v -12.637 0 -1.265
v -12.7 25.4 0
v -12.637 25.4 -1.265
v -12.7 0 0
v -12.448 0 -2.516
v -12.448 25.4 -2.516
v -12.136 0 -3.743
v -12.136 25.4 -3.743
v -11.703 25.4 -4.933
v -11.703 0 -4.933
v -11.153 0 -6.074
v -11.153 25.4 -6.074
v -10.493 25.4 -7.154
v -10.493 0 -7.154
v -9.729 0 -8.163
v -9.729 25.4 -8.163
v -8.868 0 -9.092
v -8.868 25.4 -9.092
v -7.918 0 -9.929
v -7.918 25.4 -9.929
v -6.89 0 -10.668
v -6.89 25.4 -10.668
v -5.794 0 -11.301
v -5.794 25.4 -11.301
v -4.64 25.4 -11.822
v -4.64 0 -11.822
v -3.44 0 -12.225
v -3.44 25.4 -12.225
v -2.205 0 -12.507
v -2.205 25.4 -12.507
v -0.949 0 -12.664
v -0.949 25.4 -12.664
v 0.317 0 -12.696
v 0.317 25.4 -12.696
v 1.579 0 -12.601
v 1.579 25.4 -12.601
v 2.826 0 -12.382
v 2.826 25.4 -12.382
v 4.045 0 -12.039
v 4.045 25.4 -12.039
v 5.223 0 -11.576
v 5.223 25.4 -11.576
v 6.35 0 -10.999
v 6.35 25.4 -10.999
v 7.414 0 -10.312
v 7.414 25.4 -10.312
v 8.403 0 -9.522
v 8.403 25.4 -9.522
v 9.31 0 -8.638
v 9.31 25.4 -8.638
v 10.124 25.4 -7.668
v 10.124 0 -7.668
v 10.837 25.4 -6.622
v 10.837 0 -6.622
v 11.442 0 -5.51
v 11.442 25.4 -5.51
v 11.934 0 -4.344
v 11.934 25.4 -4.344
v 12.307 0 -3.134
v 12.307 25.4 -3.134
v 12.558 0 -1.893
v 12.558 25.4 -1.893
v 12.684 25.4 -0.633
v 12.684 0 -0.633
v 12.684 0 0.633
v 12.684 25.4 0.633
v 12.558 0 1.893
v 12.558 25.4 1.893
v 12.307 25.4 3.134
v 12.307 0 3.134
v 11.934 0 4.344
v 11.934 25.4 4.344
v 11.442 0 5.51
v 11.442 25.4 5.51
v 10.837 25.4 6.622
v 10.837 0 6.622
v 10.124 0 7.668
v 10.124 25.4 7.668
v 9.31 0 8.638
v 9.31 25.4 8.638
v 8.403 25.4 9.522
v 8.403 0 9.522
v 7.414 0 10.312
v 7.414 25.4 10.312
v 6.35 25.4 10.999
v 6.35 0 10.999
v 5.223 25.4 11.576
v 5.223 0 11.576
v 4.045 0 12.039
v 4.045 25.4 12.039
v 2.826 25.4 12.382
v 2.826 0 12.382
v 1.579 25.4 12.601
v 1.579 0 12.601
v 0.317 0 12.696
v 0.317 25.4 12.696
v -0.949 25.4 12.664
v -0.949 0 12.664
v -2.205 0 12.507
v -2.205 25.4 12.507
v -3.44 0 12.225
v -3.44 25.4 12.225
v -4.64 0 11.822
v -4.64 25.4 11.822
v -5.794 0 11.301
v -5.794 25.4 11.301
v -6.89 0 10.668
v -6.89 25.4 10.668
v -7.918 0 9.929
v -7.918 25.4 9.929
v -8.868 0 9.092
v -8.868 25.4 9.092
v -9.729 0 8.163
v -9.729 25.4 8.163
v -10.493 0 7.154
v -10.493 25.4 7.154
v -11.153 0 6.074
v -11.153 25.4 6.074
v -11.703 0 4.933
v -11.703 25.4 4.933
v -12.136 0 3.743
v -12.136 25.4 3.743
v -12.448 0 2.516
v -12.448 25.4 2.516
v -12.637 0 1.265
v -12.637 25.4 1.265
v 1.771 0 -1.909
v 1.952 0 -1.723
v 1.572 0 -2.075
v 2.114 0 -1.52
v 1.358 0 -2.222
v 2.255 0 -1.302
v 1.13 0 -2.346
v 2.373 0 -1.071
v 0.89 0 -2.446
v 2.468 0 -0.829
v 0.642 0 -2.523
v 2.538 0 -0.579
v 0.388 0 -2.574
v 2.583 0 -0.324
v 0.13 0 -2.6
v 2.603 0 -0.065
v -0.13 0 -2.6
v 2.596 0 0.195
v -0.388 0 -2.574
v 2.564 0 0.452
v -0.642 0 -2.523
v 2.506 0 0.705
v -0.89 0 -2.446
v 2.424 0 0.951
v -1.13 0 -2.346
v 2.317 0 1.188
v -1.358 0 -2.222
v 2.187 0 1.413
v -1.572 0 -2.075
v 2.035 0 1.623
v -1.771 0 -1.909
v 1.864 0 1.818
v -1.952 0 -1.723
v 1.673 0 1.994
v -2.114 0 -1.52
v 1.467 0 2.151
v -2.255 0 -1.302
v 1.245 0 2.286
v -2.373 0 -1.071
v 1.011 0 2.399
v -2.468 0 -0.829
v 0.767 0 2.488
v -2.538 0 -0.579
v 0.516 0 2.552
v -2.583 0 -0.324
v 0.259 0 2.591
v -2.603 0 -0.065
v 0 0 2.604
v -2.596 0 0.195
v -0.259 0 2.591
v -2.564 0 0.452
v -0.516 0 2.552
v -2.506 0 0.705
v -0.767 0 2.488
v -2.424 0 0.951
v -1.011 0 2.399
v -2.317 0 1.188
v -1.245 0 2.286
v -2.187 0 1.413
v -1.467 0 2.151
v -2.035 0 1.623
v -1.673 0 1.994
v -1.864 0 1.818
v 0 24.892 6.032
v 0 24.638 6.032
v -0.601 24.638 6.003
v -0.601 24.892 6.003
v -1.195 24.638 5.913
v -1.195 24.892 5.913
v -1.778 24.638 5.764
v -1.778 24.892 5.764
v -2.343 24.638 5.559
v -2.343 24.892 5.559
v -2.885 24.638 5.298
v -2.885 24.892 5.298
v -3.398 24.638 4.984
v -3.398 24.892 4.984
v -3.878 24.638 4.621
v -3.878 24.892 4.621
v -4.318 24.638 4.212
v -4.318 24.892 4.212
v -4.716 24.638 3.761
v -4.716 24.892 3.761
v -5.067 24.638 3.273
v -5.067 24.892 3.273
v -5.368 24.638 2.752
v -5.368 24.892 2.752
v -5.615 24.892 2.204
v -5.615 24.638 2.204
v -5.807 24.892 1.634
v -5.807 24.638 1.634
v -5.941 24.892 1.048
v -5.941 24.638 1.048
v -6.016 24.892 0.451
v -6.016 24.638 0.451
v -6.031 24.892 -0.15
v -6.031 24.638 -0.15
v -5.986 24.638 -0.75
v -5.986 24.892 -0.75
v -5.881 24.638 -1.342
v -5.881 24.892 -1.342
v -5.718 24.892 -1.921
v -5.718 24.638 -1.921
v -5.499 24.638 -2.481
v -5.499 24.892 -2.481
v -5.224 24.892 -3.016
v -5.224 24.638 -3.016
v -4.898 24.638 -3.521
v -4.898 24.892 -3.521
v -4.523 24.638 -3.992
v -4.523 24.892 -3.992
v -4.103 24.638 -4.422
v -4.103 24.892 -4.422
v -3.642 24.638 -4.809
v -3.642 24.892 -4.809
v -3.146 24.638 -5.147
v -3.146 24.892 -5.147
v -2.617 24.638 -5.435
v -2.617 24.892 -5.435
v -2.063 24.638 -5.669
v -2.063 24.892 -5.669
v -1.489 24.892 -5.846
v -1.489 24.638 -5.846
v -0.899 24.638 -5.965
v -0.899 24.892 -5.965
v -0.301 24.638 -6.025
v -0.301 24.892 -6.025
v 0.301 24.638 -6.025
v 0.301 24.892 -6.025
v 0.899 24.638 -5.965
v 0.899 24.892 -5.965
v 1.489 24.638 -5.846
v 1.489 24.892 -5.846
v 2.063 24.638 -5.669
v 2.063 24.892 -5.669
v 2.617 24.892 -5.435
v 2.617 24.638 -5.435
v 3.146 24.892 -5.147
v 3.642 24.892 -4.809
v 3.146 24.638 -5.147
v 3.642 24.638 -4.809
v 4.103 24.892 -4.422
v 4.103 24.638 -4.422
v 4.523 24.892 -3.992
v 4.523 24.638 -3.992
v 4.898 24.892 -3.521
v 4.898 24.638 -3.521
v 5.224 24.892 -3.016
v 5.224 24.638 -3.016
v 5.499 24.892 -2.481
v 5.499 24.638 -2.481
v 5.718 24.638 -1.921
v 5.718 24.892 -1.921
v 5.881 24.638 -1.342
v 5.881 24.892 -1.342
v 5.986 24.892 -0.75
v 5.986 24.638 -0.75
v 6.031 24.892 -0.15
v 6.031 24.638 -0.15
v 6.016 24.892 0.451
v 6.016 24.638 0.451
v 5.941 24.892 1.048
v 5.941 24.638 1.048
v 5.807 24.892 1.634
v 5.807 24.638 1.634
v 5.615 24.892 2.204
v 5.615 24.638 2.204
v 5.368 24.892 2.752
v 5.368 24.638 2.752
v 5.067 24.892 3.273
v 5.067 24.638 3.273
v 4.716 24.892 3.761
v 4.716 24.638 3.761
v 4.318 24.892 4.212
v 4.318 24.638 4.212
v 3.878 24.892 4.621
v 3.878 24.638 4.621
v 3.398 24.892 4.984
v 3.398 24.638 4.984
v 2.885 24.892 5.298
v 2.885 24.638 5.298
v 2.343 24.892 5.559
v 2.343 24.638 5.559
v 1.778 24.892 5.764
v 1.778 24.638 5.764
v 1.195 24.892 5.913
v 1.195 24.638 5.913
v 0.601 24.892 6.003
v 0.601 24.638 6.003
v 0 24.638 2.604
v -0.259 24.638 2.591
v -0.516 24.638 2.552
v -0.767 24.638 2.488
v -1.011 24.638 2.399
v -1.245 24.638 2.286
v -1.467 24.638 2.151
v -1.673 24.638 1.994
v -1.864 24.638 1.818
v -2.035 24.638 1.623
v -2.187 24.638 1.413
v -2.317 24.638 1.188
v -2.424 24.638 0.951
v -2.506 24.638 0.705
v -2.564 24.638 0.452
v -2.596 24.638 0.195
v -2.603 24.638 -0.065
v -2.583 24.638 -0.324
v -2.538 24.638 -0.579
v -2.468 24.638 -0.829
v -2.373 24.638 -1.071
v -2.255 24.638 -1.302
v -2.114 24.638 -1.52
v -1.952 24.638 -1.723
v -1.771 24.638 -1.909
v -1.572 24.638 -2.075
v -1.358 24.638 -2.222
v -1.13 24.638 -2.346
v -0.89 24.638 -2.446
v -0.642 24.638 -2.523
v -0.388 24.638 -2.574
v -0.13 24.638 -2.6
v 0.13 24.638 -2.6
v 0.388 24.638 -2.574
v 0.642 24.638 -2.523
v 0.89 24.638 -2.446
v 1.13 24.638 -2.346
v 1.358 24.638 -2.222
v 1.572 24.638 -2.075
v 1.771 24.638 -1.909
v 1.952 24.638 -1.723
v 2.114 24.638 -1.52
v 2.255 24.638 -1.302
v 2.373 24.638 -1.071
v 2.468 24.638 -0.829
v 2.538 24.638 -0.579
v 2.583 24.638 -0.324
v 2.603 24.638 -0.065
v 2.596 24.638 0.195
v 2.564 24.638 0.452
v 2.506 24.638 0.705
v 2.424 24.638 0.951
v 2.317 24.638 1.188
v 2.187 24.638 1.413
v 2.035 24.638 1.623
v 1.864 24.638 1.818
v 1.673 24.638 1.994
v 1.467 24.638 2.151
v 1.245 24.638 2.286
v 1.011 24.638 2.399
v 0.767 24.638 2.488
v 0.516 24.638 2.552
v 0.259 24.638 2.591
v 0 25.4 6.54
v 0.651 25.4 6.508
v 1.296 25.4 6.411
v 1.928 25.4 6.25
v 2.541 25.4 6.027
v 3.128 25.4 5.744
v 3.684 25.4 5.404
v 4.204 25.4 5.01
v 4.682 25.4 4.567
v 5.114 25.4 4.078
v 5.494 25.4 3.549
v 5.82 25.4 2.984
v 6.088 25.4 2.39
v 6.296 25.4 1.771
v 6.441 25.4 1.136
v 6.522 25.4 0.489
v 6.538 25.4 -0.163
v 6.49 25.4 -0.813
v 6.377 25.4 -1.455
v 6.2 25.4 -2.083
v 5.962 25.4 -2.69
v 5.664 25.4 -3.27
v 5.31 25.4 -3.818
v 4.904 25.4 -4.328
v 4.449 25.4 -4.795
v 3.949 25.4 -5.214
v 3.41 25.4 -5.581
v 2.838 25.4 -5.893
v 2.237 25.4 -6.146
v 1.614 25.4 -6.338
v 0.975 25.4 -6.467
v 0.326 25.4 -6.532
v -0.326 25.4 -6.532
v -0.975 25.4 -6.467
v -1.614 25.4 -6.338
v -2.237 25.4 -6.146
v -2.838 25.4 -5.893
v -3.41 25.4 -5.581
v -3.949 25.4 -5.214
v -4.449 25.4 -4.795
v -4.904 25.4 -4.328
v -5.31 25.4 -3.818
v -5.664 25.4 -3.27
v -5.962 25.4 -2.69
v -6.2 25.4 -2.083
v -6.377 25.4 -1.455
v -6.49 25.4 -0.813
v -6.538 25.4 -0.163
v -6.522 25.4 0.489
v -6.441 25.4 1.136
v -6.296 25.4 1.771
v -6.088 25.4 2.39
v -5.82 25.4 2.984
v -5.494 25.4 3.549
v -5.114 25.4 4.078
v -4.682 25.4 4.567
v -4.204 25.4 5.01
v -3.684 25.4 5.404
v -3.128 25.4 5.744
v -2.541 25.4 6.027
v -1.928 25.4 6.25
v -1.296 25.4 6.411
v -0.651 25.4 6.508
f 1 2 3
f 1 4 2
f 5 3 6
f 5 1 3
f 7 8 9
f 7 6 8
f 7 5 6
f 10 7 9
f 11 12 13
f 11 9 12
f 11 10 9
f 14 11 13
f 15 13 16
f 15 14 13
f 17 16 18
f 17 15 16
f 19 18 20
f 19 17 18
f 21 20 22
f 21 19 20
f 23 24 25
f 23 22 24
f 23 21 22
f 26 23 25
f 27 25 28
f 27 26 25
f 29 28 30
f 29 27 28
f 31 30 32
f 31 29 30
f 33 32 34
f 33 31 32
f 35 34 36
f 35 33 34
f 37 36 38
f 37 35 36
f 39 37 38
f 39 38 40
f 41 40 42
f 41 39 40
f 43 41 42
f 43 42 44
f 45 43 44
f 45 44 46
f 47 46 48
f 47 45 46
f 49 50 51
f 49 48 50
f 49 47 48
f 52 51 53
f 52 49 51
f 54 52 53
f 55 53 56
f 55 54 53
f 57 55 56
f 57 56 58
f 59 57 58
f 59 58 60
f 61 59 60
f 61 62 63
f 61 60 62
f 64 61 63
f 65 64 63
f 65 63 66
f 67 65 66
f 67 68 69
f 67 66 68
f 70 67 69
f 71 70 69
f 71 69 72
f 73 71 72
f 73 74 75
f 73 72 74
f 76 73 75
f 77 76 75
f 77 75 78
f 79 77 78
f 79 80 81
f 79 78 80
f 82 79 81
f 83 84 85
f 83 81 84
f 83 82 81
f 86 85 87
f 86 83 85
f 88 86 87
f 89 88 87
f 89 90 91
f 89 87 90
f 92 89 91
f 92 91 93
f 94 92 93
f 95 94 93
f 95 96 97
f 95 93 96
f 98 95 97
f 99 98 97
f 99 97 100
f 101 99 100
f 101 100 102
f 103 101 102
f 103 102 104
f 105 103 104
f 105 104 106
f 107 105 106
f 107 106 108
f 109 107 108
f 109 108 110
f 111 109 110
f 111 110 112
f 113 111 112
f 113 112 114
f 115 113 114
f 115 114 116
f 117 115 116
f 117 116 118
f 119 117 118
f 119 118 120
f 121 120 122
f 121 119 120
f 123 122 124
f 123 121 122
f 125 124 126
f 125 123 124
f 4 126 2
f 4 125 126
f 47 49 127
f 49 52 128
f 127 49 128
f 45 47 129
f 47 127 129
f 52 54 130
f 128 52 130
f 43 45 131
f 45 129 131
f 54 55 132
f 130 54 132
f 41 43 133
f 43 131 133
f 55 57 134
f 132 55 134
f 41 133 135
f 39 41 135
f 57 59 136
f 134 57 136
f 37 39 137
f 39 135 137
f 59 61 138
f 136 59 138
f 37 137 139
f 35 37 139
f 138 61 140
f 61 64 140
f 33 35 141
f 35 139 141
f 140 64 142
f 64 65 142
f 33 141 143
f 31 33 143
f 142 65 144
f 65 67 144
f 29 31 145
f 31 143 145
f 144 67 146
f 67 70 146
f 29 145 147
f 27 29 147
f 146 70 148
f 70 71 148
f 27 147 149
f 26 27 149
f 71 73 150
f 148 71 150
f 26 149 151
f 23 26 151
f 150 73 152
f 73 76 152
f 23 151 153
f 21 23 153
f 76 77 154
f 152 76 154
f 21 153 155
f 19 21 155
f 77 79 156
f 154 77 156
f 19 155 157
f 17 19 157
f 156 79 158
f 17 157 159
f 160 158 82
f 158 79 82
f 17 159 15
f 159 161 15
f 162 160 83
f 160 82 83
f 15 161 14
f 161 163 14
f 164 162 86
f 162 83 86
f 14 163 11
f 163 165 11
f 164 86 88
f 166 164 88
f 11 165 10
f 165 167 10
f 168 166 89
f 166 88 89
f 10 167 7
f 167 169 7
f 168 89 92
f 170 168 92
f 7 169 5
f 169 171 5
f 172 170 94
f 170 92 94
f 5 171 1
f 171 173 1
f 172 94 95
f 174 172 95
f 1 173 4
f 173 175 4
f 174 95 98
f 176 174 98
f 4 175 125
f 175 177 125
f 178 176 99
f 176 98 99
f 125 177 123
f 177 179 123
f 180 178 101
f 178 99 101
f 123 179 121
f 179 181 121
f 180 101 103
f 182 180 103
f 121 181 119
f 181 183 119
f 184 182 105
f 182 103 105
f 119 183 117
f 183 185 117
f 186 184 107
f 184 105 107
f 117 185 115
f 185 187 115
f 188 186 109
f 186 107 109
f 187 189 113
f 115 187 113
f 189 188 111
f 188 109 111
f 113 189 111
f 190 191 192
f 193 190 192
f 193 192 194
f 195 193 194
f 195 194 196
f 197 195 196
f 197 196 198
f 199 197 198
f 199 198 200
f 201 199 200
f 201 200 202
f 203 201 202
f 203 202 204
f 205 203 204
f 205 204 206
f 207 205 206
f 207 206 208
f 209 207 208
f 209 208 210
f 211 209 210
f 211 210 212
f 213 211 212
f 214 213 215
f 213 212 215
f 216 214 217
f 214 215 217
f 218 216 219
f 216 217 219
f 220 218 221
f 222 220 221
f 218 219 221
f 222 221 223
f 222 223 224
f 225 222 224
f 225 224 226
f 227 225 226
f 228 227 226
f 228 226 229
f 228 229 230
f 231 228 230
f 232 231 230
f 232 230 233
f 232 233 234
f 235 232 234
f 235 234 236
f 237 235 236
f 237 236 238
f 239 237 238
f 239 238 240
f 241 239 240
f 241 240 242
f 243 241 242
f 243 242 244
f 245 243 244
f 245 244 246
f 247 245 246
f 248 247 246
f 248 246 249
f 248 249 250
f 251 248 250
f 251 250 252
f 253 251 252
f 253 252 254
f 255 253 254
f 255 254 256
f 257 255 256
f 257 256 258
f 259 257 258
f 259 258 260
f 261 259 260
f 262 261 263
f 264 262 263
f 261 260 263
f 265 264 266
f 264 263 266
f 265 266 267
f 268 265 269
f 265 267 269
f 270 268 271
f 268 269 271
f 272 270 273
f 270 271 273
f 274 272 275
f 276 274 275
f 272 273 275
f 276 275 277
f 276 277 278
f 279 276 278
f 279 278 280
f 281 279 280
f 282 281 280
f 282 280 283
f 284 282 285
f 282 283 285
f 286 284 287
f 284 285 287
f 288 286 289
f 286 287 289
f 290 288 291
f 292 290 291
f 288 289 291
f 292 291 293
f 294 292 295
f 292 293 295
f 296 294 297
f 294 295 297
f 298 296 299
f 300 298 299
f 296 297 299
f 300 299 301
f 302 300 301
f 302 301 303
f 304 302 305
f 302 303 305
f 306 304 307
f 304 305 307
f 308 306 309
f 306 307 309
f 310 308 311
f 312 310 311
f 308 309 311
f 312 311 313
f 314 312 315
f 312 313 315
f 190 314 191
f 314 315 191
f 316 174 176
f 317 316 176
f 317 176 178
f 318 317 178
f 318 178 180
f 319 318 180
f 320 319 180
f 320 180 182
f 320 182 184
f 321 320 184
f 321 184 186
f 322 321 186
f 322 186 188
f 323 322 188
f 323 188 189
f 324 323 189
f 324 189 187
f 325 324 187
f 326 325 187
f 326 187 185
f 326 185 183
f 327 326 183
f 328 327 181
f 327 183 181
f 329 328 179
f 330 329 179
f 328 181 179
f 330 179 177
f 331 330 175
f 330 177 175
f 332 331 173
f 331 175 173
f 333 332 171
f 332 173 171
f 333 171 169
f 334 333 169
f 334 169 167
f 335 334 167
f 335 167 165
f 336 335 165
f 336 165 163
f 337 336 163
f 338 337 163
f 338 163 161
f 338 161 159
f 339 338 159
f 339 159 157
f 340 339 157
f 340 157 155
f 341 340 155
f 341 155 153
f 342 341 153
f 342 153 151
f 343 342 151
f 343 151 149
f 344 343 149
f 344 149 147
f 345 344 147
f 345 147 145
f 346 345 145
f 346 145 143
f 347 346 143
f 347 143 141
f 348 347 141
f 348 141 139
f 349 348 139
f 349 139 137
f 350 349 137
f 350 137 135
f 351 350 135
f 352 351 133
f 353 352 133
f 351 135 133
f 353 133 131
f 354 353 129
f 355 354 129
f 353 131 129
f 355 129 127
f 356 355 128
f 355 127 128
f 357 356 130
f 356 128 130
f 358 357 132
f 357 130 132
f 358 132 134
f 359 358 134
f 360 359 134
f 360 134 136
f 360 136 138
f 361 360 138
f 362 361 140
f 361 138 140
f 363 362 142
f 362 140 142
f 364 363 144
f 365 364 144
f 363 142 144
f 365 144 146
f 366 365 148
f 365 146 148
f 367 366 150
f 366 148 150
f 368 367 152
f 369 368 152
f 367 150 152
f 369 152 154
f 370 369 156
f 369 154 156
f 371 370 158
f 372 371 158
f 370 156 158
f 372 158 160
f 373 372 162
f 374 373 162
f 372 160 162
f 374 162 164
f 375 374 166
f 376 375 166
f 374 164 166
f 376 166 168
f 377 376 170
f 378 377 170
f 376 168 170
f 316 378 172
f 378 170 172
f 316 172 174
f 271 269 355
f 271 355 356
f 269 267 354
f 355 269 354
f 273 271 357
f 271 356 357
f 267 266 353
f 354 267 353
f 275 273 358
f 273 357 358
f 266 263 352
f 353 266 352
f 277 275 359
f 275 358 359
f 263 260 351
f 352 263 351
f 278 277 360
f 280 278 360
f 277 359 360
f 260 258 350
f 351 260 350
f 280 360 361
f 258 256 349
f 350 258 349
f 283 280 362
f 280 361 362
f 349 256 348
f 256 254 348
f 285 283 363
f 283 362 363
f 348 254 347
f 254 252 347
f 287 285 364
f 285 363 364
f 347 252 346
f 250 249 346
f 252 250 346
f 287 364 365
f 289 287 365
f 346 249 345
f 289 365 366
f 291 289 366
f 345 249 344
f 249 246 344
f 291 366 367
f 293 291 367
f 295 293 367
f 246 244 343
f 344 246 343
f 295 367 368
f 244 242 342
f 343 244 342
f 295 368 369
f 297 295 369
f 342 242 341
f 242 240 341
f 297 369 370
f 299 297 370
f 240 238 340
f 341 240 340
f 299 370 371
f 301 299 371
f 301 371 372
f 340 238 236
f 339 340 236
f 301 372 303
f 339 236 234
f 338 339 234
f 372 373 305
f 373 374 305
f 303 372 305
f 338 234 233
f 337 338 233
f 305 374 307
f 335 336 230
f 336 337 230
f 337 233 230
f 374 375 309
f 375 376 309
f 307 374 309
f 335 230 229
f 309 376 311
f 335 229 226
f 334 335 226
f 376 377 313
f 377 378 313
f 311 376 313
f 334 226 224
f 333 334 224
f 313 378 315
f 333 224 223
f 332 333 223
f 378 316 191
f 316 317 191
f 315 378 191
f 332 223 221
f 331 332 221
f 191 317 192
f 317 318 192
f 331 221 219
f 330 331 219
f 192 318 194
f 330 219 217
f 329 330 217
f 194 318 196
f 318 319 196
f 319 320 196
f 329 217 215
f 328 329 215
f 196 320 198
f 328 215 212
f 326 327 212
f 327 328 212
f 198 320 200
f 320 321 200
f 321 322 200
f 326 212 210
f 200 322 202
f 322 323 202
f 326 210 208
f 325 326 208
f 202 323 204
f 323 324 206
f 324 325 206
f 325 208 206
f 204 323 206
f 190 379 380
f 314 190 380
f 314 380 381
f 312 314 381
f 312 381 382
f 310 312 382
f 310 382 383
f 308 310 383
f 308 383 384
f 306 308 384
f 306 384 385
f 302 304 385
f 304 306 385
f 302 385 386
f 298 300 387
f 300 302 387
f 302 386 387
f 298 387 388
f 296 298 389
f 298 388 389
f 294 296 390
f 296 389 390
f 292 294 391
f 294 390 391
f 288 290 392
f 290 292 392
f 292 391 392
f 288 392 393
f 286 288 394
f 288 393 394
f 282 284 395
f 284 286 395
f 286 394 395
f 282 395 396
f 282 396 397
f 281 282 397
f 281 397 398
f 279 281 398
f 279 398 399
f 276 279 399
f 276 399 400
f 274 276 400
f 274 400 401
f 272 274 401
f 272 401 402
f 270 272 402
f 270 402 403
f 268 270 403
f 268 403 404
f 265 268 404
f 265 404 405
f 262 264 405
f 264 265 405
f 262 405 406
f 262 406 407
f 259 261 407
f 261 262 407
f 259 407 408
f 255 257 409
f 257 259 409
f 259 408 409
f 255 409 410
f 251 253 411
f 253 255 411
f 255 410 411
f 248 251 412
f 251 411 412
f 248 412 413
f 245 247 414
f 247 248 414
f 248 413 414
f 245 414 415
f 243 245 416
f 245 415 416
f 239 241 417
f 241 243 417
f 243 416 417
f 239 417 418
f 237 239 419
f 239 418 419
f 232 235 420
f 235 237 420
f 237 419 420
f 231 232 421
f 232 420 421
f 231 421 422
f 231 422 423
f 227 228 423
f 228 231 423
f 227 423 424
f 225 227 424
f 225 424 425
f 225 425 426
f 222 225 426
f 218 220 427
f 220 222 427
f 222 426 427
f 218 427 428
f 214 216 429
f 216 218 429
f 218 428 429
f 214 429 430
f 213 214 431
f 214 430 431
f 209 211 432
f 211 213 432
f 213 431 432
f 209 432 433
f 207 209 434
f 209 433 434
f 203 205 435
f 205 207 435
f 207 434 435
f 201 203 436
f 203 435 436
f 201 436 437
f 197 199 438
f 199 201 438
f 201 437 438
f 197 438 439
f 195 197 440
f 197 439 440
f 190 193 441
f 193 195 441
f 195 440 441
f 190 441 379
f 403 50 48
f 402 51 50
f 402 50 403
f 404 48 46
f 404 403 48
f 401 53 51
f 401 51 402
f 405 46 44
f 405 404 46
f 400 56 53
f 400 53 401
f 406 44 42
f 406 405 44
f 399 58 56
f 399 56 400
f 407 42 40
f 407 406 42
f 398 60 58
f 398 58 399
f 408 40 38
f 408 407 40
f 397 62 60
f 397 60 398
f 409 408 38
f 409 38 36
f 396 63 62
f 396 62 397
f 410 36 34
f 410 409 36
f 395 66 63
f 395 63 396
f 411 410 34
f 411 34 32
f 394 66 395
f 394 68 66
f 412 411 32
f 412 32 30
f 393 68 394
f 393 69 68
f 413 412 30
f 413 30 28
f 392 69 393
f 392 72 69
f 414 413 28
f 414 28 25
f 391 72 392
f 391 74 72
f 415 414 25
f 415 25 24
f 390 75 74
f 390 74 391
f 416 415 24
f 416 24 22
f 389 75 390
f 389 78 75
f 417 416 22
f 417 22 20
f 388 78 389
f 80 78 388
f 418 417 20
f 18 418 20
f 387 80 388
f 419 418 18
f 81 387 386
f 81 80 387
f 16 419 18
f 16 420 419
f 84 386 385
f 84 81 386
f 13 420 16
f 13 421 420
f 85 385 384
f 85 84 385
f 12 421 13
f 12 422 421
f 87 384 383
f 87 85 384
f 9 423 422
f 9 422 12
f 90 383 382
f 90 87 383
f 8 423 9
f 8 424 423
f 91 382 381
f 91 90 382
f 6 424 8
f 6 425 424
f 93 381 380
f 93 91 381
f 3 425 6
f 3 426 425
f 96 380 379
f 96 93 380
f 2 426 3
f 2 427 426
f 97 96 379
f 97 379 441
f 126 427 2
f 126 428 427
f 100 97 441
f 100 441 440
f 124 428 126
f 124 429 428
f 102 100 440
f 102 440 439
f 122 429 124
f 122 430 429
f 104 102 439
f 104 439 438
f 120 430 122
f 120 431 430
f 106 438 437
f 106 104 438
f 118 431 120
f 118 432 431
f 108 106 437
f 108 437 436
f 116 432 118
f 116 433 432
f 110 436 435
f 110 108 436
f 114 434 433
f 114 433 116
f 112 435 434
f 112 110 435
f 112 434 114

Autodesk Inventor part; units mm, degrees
ref_plane "YZ Plane" through (0, 0, 0) normal (1, 0, 0) x (0, 1, 0)
ref_plane "XZ Plane" through (0, 0, 0) normal (0, 1, 0) x (-1, 0, 0)
ref_plane "XY Plane" through (0, 0, 0) normal (0, 0, 1) x (1, 0, 0)
sketch "Sketch1" plane through (0, 0, 0) normal (0, 1, 0) x (-1, 0, 0)
  circle A0 centre (0, 0) radius 12.7
  dimension "d0" = 25.4
extrude "Extrusion1" add sketch "Sketch1" along normal blind 25.4
hole "Hole1" at (0, 25.4, 0) direction (0, -1, 0) diameter 5.207 end through all counterbore diameter 12.065 counterbore depth 0.762
chamfer "Chamfer1" distance 0.508 angle 45 1 edges at (0, 25.4, -6.0325)
properties part number "Hole Test"
